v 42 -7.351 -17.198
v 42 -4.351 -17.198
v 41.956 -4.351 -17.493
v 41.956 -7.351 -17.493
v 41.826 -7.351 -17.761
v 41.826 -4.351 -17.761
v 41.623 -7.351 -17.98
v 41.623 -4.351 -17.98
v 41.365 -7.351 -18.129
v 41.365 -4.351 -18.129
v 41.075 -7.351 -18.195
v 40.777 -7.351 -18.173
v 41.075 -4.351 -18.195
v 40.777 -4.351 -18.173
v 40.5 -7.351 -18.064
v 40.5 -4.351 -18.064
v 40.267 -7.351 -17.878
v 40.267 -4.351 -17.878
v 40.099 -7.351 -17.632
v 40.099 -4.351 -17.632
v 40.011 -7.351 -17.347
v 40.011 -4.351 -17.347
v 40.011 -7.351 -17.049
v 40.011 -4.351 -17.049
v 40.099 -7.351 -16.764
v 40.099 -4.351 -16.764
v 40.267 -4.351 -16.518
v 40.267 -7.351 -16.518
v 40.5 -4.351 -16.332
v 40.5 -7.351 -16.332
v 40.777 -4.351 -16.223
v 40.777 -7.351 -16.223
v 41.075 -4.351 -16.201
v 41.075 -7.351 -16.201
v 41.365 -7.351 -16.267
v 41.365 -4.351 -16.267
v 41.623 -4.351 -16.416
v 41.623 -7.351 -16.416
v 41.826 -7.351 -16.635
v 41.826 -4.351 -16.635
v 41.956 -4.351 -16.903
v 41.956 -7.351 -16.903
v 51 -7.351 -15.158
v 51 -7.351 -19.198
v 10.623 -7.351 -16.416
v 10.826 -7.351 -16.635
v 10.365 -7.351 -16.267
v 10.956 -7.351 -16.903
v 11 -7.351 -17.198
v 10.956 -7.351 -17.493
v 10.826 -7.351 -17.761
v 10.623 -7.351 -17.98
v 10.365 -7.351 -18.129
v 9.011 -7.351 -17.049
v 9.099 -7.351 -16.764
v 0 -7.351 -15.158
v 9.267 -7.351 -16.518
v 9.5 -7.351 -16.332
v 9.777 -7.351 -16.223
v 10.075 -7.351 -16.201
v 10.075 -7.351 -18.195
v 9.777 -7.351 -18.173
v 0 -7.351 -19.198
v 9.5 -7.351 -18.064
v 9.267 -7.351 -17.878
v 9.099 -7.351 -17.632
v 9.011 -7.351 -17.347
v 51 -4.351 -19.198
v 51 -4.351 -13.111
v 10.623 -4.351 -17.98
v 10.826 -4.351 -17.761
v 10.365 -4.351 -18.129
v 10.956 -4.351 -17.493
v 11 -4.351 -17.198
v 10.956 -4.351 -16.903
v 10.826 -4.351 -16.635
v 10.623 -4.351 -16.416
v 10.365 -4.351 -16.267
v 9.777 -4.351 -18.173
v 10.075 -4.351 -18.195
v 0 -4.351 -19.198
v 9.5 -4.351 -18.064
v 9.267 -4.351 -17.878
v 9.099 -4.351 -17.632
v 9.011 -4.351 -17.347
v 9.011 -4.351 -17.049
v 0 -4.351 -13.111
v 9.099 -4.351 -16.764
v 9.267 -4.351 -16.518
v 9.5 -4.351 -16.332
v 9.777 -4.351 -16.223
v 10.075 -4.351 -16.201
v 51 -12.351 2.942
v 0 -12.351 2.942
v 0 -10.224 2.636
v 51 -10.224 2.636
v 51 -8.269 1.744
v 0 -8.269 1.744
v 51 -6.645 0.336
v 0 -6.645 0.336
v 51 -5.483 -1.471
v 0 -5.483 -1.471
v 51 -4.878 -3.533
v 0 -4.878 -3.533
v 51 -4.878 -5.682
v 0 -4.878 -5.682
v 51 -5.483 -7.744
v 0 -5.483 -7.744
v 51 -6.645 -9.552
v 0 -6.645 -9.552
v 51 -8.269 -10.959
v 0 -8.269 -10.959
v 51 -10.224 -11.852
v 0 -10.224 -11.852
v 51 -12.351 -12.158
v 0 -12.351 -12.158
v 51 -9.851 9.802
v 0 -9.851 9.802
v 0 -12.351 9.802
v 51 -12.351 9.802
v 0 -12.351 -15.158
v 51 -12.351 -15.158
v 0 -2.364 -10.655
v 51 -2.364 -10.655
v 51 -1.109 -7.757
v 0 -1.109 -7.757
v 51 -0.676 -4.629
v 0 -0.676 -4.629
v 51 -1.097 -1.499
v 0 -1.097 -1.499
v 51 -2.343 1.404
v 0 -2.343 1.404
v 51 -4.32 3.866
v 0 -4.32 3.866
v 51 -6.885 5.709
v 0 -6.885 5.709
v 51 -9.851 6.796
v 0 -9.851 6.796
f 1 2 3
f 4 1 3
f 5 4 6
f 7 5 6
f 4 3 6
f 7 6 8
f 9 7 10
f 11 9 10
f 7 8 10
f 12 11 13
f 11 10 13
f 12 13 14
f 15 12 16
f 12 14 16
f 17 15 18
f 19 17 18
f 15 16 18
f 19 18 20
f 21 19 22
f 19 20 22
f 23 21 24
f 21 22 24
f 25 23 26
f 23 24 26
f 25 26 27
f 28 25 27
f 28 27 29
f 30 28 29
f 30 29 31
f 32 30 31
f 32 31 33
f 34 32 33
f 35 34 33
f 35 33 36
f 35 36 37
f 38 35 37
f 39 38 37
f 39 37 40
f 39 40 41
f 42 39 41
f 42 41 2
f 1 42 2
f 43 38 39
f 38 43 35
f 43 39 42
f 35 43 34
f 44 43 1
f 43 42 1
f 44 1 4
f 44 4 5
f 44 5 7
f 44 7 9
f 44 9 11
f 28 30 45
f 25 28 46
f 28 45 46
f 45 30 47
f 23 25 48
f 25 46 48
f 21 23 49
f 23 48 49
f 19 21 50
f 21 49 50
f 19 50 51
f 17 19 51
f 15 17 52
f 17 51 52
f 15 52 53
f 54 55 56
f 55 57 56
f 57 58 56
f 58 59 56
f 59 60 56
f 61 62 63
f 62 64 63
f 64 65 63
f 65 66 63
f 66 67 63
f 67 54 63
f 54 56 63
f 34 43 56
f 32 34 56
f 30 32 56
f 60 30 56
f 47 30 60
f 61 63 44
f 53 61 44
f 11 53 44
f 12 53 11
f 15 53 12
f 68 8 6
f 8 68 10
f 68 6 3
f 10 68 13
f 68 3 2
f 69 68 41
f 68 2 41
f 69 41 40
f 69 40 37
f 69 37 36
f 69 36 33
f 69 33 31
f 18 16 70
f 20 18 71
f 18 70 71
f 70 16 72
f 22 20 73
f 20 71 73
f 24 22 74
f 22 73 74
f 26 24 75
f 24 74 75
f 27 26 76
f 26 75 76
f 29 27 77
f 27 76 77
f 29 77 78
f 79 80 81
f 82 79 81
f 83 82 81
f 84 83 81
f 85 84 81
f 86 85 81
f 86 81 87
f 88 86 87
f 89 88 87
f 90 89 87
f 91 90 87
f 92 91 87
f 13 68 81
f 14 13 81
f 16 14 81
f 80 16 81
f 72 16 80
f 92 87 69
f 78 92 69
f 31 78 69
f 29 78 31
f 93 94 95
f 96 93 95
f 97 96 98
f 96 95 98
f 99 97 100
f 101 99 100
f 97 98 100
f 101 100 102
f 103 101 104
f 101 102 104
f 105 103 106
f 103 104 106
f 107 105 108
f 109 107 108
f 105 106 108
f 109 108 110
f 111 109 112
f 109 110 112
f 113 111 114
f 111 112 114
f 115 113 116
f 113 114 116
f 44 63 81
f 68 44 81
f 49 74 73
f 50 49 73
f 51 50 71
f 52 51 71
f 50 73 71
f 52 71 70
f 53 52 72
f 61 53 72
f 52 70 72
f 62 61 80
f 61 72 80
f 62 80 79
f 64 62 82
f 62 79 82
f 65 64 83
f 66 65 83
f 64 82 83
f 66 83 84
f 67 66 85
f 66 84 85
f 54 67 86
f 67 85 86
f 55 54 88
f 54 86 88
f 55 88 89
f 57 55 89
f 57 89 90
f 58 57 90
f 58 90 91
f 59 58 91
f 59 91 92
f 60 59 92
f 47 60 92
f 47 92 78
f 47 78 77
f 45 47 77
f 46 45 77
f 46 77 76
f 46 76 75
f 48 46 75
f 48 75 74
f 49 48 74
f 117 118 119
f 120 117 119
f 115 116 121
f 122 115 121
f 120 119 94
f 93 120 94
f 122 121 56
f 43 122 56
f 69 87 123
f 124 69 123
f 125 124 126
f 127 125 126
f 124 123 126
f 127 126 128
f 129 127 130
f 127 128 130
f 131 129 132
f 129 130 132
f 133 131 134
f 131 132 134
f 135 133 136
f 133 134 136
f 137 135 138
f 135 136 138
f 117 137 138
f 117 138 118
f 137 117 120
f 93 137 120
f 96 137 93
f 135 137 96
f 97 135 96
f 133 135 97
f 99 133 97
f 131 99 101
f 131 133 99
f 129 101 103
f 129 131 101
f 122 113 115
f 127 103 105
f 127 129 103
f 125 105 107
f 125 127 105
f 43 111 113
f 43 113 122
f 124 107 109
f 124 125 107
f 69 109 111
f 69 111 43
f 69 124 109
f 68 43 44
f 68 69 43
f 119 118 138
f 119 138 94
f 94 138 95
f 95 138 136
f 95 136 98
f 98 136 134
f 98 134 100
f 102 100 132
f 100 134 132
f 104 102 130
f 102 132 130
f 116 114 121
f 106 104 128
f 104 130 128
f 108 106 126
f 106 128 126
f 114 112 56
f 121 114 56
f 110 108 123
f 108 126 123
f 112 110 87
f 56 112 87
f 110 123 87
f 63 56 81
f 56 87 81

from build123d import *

# Parameters (mm, degrees)
BOSS_EXTRUDE1_DEPTH = 51
SKETCH2_R           = 1
CUT_EXTRUDE1_DEPTH  = 789


with BuildPart() as part:
    # Sketch1 → Boss-Extrude1 (new body)
    with BuildSketch(Plane(origin=(0, 0, 0), x_dir=(0, 0, -1), z_dir=(1, 0, 0))):
        with BuildLine():
            Line((12.15786554, -12.350689419), (15.15786554, -12.350689419))
            Line((15.15786554, -12.350689419), (15.15786554, -7.350689419))
            Line((15.15786554, -7.350689419), (19.19786554, -7.350689419))
            Line((19.19786554, -7.350689419), (19.19786554, -4.350689419))
            Line((19.19786554, -4.350689419), (13.110953215, -4.350689419))
            ThreePointArc((13.110953215, -4.350689419), (1.498781312, -1.097418994), (-6.796190756, -9.850689419))
            Line((-6.796190756, -9.850689419), (-9.80213446, -9.850689419))
            Line((-9.80213446, -9.850689419), (-9.80213446, -12.350689419))
            Line((-9.80213446, -12.350689419), (-2.94213446, -12.350689419))
            ThreePointArc((-2.94213446, -12.350689419), (4.60786554, -4.800689419), (12.15786554, -12.350689419))
        make_face()
    extrude(amount=BOSS_EXTRUDE1_DEPTH)

    # Sketch2 → Cut-Extrude1 (cut)
    with BuildSketch(Plane(origin=(0, -4.350689419, 0), x_dir=(1, 0, 0), z_dir=(0, 1, 0))):
        with Locations((10, 17.19786554)):
            Circle(SKETCH2_R)
        with Locations((41, 17.19786554)):
            Circle(SKETCH2_R)
    extrude(amount=-CUT_EXTRUDE1_DEPTH, mode=Mode.SUBTRACT)


solid = part.part
